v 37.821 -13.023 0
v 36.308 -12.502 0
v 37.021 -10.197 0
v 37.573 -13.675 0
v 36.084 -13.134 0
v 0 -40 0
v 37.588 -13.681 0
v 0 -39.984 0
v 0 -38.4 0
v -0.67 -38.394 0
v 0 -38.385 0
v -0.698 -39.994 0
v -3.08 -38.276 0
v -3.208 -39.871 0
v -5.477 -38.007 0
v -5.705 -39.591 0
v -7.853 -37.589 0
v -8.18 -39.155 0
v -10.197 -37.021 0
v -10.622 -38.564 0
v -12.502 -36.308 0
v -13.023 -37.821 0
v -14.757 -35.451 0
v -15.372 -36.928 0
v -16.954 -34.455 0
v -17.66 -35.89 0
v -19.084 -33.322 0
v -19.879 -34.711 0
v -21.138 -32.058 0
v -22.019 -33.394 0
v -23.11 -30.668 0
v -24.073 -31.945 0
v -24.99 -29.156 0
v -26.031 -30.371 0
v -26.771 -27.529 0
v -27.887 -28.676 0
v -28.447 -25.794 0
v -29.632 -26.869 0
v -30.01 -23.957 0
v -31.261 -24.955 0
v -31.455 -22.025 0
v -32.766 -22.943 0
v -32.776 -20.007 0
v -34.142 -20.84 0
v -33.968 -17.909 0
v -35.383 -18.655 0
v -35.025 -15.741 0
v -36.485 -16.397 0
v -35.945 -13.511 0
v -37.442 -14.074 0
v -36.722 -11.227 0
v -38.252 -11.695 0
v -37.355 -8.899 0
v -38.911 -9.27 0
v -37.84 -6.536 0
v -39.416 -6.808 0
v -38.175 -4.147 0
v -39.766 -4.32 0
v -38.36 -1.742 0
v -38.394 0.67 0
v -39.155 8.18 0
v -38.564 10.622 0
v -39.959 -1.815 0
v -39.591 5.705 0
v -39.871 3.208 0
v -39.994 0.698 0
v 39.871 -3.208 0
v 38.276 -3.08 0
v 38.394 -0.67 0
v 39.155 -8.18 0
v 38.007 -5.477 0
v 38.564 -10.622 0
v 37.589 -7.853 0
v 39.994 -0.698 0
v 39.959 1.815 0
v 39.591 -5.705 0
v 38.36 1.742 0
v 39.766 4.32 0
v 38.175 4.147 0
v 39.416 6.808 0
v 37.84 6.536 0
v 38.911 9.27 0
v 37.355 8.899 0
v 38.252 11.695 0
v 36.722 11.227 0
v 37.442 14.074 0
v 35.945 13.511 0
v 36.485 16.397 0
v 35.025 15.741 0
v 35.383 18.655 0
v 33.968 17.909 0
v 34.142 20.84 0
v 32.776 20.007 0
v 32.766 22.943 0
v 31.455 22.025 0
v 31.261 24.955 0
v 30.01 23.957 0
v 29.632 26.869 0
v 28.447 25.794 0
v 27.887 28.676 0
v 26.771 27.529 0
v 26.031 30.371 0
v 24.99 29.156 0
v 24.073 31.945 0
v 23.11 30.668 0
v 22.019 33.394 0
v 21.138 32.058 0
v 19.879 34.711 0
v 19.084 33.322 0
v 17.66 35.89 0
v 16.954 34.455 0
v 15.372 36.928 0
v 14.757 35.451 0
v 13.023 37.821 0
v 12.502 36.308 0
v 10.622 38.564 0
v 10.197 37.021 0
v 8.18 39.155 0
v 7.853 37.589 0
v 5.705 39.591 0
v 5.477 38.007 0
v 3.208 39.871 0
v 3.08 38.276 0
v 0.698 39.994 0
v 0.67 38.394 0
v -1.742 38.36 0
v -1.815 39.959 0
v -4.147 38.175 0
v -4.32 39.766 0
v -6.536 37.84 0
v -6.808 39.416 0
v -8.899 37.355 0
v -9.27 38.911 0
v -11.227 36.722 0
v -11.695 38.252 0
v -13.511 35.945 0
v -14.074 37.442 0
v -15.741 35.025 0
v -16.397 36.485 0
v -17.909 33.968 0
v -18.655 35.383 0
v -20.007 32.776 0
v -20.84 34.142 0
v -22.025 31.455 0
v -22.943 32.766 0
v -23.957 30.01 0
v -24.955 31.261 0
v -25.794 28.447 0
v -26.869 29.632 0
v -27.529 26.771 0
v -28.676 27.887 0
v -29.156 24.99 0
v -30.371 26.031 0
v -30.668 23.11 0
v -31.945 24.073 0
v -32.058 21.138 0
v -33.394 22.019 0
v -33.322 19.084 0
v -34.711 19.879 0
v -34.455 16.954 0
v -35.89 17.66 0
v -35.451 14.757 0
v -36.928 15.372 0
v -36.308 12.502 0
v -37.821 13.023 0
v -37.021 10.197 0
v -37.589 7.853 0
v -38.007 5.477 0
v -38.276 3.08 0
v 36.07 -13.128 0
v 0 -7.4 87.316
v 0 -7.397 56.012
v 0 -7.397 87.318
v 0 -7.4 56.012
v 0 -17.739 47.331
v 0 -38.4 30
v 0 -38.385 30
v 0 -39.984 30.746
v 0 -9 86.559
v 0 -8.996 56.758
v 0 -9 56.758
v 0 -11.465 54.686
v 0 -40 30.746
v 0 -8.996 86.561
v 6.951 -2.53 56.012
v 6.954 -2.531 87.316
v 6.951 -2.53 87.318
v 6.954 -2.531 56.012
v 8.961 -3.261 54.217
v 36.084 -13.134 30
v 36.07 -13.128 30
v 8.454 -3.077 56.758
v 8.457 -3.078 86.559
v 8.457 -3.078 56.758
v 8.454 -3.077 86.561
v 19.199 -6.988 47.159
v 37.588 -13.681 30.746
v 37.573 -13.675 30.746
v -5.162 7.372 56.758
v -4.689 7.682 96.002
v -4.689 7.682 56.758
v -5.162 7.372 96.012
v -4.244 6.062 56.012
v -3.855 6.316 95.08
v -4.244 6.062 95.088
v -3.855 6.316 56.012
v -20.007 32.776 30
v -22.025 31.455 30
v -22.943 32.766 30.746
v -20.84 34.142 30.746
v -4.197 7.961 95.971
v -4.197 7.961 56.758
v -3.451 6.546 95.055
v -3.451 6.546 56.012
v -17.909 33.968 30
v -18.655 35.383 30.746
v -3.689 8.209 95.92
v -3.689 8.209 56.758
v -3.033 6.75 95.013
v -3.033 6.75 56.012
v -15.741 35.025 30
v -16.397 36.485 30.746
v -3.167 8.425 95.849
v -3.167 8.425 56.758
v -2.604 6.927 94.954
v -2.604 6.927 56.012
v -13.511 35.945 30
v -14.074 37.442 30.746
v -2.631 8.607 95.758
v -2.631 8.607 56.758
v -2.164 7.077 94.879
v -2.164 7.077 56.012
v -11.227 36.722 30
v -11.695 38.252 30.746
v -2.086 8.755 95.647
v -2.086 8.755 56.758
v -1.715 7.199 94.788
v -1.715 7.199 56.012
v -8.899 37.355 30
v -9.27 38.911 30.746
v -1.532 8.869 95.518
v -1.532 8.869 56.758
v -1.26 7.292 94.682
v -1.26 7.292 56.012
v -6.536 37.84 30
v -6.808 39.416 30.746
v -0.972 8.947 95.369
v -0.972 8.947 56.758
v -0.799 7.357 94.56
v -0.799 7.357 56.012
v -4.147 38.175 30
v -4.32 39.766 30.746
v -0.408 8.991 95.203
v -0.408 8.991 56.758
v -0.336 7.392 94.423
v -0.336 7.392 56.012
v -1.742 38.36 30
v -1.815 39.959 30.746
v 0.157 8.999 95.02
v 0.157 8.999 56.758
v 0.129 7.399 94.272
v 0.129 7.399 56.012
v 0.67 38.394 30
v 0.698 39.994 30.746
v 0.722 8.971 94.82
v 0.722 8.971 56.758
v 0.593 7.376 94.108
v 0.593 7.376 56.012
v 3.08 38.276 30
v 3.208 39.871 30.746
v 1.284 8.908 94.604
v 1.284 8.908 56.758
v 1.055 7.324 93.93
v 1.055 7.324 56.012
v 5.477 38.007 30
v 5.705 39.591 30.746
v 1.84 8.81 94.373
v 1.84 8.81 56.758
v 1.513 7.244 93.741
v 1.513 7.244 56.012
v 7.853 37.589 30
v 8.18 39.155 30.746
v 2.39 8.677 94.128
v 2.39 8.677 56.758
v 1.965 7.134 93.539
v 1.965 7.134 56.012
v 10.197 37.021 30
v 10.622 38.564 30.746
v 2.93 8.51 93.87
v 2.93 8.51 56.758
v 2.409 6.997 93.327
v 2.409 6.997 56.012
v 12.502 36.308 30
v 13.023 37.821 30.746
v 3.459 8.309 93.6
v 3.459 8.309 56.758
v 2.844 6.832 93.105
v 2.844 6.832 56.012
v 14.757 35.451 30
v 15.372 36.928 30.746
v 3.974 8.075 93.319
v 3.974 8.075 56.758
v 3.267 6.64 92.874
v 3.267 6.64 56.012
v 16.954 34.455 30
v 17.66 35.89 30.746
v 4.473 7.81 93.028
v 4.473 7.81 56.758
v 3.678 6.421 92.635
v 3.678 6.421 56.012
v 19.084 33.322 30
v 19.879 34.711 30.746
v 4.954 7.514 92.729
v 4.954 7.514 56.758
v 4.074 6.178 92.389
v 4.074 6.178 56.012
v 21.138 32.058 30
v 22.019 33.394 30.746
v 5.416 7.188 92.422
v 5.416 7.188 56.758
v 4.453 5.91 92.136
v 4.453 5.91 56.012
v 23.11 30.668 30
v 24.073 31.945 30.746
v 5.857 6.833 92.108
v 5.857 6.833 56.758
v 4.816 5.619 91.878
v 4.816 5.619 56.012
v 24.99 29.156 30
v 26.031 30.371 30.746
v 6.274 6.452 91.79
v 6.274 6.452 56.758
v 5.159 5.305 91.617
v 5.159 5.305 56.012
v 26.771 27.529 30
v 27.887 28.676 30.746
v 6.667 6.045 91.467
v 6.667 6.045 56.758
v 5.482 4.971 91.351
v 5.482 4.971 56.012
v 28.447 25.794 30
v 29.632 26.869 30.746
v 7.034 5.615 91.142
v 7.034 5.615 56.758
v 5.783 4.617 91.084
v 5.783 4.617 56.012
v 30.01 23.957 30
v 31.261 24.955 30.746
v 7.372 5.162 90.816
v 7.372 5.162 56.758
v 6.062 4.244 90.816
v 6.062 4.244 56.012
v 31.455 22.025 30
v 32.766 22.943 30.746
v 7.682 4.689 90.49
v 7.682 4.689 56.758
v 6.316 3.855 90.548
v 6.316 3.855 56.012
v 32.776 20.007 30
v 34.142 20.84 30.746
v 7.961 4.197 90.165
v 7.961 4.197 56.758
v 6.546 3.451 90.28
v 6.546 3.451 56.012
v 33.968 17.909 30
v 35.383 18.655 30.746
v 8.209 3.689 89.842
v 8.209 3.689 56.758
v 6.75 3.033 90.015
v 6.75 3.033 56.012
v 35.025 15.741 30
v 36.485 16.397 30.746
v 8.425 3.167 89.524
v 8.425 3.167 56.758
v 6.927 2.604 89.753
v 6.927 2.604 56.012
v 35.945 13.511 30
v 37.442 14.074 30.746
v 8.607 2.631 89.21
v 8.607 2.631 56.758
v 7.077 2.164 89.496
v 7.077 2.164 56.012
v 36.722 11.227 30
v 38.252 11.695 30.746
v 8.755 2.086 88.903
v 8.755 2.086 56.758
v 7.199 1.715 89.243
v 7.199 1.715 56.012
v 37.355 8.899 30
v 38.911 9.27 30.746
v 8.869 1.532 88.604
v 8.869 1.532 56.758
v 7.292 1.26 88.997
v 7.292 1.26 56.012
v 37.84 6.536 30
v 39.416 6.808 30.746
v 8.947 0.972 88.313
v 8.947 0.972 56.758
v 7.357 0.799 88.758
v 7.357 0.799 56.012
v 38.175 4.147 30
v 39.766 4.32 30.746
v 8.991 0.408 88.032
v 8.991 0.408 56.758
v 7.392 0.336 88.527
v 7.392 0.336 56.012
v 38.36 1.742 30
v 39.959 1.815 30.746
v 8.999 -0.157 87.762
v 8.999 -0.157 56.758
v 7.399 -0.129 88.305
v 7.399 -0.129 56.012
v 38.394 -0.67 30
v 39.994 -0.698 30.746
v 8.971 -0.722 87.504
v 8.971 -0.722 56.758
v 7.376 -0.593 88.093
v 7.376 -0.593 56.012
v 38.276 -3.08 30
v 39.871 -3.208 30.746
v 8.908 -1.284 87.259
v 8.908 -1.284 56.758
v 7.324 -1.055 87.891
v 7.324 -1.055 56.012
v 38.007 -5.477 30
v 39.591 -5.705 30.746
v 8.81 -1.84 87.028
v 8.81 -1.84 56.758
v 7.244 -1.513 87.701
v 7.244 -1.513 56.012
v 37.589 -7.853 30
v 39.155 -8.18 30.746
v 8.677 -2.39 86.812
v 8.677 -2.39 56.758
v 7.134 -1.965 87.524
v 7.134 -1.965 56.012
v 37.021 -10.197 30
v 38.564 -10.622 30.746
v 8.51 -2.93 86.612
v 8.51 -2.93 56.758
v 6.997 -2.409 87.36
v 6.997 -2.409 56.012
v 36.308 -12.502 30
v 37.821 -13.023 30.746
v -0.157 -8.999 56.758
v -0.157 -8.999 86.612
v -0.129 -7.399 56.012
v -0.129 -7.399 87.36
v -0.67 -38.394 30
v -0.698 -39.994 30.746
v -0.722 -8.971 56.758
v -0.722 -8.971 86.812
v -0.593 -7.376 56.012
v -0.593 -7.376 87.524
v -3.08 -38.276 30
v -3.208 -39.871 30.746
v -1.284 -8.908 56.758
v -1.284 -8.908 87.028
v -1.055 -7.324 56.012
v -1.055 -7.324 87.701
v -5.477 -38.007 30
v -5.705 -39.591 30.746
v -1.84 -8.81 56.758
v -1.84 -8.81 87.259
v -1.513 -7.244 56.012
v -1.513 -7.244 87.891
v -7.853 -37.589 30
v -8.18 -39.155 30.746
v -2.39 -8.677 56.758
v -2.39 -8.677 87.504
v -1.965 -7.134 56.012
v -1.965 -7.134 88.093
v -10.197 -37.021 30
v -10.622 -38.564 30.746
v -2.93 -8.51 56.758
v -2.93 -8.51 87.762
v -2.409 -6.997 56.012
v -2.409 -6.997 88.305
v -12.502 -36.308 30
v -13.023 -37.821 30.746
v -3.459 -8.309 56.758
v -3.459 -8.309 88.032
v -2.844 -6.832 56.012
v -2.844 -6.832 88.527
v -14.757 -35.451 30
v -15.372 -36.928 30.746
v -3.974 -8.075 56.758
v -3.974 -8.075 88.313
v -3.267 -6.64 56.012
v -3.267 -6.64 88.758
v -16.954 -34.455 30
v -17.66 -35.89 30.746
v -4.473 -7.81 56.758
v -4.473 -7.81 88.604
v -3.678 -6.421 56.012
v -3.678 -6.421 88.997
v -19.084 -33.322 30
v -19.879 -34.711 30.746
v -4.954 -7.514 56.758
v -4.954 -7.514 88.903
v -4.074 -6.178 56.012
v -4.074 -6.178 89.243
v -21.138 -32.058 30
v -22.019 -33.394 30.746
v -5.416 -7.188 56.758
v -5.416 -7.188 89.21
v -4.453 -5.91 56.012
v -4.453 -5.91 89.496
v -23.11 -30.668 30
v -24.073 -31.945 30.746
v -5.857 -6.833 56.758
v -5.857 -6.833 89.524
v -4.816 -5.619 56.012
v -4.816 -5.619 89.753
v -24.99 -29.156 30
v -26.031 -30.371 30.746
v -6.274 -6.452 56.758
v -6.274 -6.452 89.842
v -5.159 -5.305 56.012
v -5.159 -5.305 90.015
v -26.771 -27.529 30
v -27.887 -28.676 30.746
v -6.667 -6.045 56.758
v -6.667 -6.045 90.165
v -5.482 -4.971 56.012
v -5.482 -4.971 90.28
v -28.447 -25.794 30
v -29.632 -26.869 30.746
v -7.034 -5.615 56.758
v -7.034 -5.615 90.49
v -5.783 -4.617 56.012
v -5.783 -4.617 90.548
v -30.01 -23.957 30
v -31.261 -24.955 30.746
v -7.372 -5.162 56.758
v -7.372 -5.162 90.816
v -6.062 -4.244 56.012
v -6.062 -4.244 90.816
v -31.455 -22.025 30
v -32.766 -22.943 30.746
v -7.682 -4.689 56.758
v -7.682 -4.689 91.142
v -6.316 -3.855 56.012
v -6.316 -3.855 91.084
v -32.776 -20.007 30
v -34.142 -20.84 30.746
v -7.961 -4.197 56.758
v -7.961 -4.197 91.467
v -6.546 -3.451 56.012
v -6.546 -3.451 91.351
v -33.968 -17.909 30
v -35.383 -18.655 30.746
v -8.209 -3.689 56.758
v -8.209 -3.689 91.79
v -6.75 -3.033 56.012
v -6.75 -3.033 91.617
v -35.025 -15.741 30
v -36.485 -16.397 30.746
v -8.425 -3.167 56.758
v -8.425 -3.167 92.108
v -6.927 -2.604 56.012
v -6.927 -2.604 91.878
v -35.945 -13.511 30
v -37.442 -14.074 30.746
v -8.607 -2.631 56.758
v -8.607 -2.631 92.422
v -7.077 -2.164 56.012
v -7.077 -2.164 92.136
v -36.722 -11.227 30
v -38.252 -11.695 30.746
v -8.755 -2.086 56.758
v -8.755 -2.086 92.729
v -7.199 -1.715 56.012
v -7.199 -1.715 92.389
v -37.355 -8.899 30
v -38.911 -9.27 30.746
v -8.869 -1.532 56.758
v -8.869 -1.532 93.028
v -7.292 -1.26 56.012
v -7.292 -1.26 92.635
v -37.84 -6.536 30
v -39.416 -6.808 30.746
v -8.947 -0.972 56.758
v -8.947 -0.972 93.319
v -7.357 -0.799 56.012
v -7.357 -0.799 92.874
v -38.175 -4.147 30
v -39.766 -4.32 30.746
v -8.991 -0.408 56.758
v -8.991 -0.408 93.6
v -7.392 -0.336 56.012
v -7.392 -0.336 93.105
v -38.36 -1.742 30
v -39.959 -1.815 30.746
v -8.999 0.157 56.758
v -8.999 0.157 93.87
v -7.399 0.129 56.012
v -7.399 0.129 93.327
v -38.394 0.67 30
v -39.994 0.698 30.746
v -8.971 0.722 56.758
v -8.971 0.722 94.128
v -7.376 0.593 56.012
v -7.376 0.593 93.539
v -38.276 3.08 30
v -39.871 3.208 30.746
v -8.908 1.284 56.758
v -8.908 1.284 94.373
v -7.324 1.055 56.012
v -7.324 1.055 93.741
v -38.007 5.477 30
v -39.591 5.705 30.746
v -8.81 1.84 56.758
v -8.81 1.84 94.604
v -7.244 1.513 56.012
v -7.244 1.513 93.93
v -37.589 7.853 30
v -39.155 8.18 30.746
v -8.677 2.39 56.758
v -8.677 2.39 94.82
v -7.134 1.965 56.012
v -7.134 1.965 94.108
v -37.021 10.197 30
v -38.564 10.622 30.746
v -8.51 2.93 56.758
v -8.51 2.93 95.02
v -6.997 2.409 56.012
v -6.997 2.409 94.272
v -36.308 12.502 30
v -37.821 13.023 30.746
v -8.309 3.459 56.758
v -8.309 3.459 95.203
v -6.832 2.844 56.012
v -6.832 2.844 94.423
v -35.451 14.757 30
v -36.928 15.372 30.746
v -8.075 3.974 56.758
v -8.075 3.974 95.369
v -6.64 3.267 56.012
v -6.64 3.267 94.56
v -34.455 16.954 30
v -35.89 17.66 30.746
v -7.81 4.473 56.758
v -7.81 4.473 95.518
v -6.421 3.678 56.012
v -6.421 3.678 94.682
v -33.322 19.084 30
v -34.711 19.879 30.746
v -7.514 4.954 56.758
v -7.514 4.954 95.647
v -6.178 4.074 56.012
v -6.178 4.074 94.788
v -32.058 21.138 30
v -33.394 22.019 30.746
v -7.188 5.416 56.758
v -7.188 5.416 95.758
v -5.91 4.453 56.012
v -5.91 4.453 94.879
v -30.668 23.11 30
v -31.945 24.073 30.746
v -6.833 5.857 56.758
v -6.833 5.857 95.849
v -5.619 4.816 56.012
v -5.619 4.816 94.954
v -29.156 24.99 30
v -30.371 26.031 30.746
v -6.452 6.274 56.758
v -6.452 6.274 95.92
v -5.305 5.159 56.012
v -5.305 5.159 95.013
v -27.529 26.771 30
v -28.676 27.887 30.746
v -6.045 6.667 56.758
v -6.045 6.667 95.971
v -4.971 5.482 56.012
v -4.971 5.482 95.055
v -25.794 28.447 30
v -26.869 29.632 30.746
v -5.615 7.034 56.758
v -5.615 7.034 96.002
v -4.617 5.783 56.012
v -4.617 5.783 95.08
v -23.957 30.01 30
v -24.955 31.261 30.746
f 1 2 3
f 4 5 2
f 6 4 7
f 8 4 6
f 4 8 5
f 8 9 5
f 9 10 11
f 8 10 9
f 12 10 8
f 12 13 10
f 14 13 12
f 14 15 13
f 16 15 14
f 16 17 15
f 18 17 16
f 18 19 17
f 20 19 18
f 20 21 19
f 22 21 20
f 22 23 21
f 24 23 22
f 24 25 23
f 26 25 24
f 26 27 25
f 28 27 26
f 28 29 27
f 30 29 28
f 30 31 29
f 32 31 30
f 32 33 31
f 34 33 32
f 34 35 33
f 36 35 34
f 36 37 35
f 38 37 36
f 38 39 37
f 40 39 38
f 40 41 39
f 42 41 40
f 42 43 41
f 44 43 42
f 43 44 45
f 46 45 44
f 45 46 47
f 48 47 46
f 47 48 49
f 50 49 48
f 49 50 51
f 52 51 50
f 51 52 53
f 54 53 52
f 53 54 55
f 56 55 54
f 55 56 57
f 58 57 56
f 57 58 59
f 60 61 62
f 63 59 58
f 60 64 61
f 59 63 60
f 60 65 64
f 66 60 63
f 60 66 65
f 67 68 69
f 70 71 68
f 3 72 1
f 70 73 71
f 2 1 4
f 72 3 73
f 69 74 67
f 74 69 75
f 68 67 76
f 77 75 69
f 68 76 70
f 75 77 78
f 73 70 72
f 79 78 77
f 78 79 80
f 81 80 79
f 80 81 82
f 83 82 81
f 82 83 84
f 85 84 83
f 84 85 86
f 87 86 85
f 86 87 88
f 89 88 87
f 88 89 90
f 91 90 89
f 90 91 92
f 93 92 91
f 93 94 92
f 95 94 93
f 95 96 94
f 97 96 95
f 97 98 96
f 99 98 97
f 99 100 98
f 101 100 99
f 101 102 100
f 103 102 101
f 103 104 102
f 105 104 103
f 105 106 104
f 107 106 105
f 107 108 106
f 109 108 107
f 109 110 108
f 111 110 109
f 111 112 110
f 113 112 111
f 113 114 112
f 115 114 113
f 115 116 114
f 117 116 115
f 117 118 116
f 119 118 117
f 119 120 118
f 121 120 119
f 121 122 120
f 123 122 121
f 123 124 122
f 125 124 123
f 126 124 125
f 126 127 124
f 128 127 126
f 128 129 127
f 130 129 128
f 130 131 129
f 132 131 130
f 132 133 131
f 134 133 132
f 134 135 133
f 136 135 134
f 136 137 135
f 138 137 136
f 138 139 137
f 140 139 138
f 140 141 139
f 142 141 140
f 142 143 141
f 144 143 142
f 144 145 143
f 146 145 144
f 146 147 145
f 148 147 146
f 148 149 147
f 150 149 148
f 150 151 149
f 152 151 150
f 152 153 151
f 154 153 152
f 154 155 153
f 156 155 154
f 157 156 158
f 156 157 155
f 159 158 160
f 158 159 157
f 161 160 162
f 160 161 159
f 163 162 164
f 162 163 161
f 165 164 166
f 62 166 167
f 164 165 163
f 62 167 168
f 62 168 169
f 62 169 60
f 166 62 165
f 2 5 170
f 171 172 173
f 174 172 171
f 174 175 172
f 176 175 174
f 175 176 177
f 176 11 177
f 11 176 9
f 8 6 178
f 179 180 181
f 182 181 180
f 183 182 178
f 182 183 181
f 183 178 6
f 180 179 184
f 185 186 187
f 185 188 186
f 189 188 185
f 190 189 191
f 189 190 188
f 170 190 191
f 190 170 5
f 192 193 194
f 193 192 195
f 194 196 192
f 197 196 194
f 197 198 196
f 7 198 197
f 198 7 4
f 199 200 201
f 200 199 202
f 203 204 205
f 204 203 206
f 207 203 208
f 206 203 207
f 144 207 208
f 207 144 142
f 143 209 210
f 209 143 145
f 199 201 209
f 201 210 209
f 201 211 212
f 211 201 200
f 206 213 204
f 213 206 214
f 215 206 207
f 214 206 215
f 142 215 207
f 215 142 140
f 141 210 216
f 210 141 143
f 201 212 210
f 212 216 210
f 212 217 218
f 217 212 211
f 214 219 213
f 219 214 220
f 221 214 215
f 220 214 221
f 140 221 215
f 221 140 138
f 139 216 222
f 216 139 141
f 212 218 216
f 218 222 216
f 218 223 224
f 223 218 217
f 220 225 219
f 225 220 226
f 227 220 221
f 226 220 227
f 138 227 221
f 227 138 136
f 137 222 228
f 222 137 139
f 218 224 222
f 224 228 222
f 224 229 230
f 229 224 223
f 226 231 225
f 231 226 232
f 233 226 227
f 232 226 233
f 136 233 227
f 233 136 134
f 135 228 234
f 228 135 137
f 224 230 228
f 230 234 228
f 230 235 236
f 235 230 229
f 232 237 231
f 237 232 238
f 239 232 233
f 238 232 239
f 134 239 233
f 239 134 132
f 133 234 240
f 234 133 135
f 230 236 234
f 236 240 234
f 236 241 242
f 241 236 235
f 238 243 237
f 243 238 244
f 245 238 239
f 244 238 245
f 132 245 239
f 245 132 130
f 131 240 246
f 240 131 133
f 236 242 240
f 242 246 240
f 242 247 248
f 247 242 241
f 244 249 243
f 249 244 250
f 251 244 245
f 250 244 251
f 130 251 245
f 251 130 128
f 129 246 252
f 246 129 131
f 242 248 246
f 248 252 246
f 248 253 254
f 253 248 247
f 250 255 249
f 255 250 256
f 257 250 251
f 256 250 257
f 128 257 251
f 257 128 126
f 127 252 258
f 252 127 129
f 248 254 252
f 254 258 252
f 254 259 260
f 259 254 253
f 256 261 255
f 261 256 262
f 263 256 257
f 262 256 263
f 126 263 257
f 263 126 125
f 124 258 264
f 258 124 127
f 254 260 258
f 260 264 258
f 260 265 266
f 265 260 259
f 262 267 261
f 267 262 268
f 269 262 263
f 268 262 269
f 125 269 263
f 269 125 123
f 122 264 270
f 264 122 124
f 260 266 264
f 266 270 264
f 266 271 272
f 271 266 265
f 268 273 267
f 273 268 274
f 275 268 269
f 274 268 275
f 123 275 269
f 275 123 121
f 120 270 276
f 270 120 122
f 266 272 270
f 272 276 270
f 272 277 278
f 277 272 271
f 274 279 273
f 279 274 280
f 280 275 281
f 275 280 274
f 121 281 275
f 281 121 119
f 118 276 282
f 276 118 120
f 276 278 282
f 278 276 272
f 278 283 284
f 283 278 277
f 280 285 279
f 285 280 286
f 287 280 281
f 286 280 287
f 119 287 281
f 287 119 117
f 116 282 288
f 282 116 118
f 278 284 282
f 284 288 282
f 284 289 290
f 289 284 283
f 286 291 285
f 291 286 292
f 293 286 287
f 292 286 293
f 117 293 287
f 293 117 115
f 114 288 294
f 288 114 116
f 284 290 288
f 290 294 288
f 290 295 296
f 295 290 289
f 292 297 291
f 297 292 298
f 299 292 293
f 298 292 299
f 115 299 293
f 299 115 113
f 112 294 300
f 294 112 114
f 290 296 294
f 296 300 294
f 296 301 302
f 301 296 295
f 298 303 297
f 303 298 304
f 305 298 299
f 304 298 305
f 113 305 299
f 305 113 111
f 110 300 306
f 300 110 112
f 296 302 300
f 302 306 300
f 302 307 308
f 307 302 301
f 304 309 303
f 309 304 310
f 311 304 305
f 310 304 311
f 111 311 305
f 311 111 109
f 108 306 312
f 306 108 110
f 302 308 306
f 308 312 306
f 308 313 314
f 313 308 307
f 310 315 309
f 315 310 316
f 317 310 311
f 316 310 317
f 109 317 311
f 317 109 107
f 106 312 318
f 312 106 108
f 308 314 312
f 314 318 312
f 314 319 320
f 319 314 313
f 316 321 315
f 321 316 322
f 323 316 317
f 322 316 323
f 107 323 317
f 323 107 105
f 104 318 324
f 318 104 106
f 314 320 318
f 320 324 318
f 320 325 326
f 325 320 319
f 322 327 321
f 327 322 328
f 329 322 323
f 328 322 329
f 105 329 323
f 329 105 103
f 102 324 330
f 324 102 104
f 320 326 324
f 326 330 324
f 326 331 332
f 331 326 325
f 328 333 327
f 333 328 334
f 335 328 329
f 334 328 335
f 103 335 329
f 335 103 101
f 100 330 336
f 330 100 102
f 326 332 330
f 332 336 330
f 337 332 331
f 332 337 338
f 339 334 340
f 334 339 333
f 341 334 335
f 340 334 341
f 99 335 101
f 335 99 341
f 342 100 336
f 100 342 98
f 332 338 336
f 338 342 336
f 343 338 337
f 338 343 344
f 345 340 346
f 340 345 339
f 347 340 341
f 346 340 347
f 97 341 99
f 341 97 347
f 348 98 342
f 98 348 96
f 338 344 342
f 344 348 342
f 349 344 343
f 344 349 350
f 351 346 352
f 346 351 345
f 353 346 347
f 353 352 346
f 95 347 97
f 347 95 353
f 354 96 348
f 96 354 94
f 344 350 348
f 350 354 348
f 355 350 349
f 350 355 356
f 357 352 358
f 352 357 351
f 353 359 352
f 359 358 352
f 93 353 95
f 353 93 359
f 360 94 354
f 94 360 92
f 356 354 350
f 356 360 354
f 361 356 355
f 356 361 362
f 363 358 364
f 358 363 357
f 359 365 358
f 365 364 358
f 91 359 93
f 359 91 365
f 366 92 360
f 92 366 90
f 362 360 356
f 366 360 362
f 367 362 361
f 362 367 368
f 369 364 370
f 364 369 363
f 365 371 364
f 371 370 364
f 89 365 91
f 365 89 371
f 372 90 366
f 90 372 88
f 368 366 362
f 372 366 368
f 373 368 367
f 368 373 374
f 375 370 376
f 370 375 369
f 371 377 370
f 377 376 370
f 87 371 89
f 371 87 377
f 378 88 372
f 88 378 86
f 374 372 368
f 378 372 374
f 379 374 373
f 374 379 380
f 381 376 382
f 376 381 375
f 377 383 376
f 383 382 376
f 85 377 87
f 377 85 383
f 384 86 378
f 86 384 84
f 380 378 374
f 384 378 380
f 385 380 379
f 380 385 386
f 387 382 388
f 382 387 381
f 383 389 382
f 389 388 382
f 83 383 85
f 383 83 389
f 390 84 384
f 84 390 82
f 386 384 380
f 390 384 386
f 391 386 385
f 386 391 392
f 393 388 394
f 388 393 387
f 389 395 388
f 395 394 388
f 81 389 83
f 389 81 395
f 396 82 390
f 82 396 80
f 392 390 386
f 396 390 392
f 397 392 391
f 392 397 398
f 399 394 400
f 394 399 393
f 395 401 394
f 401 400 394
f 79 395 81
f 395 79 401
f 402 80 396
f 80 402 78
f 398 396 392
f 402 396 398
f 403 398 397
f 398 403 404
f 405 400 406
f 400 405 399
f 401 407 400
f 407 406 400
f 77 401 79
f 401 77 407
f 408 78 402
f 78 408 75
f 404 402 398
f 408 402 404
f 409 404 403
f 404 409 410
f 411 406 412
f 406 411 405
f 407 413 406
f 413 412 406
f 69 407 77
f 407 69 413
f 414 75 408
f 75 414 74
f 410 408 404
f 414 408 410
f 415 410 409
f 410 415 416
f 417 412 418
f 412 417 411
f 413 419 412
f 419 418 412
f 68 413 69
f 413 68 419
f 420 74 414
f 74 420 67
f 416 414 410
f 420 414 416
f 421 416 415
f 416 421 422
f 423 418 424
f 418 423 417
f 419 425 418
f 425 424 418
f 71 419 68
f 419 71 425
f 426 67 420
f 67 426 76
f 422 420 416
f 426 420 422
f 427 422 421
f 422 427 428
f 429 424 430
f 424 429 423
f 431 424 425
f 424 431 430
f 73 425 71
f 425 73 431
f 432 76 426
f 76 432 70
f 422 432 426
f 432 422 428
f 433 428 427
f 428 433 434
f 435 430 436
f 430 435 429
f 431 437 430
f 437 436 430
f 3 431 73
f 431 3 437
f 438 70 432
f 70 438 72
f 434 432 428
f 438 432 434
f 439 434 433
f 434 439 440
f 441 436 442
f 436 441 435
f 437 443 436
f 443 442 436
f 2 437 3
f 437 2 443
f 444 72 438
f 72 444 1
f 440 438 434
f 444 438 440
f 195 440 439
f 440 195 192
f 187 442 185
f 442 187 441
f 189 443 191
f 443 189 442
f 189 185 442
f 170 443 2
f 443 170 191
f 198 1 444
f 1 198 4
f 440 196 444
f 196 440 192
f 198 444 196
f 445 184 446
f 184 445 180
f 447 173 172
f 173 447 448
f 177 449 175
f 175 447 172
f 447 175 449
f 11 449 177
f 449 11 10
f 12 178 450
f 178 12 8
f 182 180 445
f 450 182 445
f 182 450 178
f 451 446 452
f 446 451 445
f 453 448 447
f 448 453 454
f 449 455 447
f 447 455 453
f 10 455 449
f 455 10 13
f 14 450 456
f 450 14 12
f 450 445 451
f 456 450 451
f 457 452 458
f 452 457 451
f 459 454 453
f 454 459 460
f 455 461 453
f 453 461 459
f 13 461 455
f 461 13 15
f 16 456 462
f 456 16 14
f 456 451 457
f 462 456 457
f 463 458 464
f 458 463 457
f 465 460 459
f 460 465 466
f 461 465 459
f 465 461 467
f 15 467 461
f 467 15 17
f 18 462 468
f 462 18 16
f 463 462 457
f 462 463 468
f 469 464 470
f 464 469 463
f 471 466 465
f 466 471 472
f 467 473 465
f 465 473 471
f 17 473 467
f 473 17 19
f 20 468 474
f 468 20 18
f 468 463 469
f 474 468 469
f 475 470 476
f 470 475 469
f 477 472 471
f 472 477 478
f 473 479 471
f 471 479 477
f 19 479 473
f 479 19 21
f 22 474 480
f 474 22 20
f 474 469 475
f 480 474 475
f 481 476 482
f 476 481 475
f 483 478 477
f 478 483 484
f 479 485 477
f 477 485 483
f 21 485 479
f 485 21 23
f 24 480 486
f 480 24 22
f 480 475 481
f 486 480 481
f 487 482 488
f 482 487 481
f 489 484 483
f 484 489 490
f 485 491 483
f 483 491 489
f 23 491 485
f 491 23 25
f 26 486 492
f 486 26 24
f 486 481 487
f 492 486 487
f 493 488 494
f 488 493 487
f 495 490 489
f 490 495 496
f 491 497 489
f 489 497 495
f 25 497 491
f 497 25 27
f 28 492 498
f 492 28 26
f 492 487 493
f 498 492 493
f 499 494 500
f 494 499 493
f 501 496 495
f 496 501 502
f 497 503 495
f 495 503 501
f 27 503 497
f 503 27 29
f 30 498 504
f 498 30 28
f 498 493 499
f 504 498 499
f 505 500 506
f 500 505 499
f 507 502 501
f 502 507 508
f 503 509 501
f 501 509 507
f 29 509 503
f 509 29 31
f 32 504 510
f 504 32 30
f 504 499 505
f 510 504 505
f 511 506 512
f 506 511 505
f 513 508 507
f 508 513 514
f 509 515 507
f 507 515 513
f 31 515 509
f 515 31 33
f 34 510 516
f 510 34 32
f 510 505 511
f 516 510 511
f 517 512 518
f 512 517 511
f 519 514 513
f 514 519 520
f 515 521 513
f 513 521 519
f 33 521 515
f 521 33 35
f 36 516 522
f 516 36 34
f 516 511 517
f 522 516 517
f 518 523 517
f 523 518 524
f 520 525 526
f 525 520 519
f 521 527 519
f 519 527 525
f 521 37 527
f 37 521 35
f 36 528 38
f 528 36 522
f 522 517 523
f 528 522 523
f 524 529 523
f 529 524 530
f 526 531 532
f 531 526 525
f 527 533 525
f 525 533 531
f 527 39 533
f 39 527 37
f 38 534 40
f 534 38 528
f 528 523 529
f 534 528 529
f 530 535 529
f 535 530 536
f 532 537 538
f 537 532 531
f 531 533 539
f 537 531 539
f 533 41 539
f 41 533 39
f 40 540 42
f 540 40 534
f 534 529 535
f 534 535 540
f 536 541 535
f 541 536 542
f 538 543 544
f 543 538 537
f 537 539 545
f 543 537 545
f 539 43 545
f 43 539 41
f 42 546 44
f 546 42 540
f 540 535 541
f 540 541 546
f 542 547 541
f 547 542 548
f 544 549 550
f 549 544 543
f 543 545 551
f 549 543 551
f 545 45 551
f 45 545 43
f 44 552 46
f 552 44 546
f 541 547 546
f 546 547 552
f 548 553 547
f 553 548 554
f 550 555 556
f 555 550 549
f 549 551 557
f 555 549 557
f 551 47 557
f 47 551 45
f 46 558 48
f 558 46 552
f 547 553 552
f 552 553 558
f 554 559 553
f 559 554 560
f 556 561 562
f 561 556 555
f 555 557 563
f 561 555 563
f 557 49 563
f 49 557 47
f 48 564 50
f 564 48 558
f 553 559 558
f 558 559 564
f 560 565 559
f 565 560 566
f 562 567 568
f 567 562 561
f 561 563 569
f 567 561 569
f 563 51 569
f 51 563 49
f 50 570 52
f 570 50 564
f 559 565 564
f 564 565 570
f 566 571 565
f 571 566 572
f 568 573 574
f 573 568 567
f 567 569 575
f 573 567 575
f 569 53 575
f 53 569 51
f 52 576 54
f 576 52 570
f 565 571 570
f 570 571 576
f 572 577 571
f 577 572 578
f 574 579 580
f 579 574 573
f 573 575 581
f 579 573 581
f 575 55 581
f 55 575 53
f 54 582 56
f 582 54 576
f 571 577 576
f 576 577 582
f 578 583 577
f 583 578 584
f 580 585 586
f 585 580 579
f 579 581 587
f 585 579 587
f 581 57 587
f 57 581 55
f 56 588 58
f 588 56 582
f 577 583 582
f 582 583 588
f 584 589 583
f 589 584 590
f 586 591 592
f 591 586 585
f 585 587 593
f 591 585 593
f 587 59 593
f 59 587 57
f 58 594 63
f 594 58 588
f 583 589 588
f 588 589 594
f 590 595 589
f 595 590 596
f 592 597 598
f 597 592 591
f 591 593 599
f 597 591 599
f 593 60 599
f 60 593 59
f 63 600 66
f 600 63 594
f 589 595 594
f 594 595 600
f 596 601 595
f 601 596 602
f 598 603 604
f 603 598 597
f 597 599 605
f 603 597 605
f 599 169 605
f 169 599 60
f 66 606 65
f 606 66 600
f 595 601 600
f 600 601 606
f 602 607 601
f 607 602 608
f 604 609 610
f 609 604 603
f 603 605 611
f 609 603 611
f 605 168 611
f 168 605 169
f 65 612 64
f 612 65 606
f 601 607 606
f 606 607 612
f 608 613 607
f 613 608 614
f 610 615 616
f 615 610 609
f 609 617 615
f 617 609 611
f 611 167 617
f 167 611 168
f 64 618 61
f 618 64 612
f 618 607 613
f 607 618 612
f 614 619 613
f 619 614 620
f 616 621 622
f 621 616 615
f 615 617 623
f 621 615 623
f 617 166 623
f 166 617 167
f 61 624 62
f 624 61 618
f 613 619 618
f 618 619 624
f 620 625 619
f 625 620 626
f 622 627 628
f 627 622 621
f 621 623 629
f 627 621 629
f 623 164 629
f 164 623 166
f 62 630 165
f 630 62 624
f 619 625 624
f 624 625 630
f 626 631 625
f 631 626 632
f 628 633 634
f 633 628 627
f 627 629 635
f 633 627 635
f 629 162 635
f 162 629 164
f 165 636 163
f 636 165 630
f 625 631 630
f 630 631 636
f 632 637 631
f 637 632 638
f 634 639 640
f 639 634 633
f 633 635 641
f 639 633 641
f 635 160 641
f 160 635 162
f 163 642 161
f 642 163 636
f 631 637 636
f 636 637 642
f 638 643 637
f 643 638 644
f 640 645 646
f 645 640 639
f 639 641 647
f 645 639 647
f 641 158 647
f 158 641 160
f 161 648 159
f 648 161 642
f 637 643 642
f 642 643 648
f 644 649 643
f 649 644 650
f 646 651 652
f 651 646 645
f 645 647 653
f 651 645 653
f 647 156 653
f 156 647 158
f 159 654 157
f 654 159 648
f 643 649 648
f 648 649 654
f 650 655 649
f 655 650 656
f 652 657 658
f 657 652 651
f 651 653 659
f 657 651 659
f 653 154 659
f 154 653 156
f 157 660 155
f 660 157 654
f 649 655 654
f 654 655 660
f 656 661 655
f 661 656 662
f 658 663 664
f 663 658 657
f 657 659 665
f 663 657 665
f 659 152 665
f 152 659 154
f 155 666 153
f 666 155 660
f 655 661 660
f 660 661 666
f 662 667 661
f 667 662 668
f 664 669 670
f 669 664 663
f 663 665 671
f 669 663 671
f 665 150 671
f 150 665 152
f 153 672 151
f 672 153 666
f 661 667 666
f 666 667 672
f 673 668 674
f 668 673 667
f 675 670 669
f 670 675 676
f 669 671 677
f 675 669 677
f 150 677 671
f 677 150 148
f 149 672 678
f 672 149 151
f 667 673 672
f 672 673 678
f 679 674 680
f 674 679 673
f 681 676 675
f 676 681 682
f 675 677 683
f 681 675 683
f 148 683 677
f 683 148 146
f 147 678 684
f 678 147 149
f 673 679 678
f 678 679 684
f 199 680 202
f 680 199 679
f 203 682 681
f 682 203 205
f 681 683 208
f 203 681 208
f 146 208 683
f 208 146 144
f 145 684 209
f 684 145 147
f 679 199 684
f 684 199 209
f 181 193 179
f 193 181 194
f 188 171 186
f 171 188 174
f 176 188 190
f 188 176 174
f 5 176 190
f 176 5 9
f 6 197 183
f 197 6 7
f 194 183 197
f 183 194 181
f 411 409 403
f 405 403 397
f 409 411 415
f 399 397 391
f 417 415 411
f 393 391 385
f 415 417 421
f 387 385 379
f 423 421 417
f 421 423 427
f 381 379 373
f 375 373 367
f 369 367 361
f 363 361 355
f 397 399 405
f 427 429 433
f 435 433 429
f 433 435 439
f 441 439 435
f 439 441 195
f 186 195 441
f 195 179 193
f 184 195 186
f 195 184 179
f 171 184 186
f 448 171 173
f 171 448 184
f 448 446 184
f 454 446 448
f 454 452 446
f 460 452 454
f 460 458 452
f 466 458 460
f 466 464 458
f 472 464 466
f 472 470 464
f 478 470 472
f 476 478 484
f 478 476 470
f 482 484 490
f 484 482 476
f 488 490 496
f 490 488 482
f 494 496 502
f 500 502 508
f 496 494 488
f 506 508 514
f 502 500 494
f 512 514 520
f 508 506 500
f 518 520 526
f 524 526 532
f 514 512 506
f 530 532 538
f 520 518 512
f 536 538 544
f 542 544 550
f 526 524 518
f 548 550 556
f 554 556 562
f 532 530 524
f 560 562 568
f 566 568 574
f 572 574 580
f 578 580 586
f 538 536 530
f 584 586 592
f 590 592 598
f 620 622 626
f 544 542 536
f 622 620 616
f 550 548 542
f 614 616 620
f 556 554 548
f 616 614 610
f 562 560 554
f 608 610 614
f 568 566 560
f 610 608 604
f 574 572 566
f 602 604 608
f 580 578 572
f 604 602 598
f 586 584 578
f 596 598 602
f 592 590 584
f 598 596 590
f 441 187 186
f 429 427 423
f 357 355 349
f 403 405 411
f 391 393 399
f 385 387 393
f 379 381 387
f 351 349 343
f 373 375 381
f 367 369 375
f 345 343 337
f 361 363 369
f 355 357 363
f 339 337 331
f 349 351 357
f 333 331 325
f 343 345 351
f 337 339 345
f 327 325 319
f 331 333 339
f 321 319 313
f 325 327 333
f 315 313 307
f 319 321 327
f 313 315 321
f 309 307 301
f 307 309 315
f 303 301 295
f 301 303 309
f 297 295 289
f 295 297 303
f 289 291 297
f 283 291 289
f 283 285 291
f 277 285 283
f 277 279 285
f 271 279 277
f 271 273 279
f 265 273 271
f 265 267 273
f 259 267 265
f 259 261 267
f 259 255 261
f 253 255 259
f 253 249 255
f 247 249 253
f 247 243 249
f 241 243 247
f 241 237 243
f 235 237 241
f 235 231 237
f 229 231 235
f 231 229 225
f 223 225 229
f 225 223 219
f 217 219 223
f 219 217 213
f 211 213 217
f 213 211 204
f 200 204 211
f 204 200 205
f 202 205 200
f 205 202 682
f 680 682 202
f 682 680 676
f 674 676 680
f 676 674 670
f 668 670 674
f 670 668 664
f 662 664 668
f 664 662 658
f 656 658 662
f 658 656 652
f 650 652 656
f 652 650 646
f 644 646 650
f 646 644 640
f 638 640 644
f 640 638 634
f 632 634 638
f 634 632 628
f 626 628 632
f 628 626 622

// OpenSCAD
// - Outer diameter of the stem
StemOD = 18;
// - Length of stem
StemZ = 40;
// - Outer diameter of rim
RimOD = 80;
// - Height of rim
RimZ = 30;
// - Thickness of walls
T = 1.6;
// - Conical section slope angle
Slope = 40;

/* [Hidden] */
//Points given an inverted funnel
Z0  = 0;
OR0 = RimOD/2;
IR0 = OR0-T;
Z1  = RimZ;
Z2  = Z1+ (RimOD-StemOD)*0.5*tan(Slope);
echo(Z2);
Z3  = Z2+ StemZ;
OR3 = StemOD/2;
IR3 = OR3-T;

L = (OR0-IR3) / cos(Slope);
SliceAng=35;
Slice = 2*OR0*sin(SliceAng);

//rotate to put the layer start point in an ugly location.
rotate(SliceAng-90) 
difference() {
    union() {
        difference() {
            //main body
            rotate_extrude($fn=100) 
                TwoDProfile();
            //breather slice subtraction
            SliceBlock(SliceAng);
        }
        //breather slice addition
        intersection() {
            scale([cos(SliceAng),1,1])
                rotate([90,0])
                    linear_extrude(Slice, center=true)
                        TwoDProfile();
            SliceBlock(SliceAng);
        }
    }
    //tapered tip
    translate([-OR3, -RimOD/2, Z3])
        rotate([0,30,0])
            cube(RimOD);
}

module TwoDProfile() {
    //rim
    translate([IR0,0])
        square([T, Z1]);
    //stem
    translate([IR3, Z2])
        square([T, Z3-Z2]);
    //cone
    difference() {
        translate([IR3, Z2])
        rotate(-Slope-90)
        mirror()
            square([T,L]);
        translate([OR0,0])
            square([2*T, Z3]);
    }
}

module SliceBlock(a=40) {
    intersection() {
        rotate(-a) cube(Z3);
        rotate(a-90) cube(Z3);
    }
}

echo(str("FileName: Funnel",StemOD,"x",RimOD));
